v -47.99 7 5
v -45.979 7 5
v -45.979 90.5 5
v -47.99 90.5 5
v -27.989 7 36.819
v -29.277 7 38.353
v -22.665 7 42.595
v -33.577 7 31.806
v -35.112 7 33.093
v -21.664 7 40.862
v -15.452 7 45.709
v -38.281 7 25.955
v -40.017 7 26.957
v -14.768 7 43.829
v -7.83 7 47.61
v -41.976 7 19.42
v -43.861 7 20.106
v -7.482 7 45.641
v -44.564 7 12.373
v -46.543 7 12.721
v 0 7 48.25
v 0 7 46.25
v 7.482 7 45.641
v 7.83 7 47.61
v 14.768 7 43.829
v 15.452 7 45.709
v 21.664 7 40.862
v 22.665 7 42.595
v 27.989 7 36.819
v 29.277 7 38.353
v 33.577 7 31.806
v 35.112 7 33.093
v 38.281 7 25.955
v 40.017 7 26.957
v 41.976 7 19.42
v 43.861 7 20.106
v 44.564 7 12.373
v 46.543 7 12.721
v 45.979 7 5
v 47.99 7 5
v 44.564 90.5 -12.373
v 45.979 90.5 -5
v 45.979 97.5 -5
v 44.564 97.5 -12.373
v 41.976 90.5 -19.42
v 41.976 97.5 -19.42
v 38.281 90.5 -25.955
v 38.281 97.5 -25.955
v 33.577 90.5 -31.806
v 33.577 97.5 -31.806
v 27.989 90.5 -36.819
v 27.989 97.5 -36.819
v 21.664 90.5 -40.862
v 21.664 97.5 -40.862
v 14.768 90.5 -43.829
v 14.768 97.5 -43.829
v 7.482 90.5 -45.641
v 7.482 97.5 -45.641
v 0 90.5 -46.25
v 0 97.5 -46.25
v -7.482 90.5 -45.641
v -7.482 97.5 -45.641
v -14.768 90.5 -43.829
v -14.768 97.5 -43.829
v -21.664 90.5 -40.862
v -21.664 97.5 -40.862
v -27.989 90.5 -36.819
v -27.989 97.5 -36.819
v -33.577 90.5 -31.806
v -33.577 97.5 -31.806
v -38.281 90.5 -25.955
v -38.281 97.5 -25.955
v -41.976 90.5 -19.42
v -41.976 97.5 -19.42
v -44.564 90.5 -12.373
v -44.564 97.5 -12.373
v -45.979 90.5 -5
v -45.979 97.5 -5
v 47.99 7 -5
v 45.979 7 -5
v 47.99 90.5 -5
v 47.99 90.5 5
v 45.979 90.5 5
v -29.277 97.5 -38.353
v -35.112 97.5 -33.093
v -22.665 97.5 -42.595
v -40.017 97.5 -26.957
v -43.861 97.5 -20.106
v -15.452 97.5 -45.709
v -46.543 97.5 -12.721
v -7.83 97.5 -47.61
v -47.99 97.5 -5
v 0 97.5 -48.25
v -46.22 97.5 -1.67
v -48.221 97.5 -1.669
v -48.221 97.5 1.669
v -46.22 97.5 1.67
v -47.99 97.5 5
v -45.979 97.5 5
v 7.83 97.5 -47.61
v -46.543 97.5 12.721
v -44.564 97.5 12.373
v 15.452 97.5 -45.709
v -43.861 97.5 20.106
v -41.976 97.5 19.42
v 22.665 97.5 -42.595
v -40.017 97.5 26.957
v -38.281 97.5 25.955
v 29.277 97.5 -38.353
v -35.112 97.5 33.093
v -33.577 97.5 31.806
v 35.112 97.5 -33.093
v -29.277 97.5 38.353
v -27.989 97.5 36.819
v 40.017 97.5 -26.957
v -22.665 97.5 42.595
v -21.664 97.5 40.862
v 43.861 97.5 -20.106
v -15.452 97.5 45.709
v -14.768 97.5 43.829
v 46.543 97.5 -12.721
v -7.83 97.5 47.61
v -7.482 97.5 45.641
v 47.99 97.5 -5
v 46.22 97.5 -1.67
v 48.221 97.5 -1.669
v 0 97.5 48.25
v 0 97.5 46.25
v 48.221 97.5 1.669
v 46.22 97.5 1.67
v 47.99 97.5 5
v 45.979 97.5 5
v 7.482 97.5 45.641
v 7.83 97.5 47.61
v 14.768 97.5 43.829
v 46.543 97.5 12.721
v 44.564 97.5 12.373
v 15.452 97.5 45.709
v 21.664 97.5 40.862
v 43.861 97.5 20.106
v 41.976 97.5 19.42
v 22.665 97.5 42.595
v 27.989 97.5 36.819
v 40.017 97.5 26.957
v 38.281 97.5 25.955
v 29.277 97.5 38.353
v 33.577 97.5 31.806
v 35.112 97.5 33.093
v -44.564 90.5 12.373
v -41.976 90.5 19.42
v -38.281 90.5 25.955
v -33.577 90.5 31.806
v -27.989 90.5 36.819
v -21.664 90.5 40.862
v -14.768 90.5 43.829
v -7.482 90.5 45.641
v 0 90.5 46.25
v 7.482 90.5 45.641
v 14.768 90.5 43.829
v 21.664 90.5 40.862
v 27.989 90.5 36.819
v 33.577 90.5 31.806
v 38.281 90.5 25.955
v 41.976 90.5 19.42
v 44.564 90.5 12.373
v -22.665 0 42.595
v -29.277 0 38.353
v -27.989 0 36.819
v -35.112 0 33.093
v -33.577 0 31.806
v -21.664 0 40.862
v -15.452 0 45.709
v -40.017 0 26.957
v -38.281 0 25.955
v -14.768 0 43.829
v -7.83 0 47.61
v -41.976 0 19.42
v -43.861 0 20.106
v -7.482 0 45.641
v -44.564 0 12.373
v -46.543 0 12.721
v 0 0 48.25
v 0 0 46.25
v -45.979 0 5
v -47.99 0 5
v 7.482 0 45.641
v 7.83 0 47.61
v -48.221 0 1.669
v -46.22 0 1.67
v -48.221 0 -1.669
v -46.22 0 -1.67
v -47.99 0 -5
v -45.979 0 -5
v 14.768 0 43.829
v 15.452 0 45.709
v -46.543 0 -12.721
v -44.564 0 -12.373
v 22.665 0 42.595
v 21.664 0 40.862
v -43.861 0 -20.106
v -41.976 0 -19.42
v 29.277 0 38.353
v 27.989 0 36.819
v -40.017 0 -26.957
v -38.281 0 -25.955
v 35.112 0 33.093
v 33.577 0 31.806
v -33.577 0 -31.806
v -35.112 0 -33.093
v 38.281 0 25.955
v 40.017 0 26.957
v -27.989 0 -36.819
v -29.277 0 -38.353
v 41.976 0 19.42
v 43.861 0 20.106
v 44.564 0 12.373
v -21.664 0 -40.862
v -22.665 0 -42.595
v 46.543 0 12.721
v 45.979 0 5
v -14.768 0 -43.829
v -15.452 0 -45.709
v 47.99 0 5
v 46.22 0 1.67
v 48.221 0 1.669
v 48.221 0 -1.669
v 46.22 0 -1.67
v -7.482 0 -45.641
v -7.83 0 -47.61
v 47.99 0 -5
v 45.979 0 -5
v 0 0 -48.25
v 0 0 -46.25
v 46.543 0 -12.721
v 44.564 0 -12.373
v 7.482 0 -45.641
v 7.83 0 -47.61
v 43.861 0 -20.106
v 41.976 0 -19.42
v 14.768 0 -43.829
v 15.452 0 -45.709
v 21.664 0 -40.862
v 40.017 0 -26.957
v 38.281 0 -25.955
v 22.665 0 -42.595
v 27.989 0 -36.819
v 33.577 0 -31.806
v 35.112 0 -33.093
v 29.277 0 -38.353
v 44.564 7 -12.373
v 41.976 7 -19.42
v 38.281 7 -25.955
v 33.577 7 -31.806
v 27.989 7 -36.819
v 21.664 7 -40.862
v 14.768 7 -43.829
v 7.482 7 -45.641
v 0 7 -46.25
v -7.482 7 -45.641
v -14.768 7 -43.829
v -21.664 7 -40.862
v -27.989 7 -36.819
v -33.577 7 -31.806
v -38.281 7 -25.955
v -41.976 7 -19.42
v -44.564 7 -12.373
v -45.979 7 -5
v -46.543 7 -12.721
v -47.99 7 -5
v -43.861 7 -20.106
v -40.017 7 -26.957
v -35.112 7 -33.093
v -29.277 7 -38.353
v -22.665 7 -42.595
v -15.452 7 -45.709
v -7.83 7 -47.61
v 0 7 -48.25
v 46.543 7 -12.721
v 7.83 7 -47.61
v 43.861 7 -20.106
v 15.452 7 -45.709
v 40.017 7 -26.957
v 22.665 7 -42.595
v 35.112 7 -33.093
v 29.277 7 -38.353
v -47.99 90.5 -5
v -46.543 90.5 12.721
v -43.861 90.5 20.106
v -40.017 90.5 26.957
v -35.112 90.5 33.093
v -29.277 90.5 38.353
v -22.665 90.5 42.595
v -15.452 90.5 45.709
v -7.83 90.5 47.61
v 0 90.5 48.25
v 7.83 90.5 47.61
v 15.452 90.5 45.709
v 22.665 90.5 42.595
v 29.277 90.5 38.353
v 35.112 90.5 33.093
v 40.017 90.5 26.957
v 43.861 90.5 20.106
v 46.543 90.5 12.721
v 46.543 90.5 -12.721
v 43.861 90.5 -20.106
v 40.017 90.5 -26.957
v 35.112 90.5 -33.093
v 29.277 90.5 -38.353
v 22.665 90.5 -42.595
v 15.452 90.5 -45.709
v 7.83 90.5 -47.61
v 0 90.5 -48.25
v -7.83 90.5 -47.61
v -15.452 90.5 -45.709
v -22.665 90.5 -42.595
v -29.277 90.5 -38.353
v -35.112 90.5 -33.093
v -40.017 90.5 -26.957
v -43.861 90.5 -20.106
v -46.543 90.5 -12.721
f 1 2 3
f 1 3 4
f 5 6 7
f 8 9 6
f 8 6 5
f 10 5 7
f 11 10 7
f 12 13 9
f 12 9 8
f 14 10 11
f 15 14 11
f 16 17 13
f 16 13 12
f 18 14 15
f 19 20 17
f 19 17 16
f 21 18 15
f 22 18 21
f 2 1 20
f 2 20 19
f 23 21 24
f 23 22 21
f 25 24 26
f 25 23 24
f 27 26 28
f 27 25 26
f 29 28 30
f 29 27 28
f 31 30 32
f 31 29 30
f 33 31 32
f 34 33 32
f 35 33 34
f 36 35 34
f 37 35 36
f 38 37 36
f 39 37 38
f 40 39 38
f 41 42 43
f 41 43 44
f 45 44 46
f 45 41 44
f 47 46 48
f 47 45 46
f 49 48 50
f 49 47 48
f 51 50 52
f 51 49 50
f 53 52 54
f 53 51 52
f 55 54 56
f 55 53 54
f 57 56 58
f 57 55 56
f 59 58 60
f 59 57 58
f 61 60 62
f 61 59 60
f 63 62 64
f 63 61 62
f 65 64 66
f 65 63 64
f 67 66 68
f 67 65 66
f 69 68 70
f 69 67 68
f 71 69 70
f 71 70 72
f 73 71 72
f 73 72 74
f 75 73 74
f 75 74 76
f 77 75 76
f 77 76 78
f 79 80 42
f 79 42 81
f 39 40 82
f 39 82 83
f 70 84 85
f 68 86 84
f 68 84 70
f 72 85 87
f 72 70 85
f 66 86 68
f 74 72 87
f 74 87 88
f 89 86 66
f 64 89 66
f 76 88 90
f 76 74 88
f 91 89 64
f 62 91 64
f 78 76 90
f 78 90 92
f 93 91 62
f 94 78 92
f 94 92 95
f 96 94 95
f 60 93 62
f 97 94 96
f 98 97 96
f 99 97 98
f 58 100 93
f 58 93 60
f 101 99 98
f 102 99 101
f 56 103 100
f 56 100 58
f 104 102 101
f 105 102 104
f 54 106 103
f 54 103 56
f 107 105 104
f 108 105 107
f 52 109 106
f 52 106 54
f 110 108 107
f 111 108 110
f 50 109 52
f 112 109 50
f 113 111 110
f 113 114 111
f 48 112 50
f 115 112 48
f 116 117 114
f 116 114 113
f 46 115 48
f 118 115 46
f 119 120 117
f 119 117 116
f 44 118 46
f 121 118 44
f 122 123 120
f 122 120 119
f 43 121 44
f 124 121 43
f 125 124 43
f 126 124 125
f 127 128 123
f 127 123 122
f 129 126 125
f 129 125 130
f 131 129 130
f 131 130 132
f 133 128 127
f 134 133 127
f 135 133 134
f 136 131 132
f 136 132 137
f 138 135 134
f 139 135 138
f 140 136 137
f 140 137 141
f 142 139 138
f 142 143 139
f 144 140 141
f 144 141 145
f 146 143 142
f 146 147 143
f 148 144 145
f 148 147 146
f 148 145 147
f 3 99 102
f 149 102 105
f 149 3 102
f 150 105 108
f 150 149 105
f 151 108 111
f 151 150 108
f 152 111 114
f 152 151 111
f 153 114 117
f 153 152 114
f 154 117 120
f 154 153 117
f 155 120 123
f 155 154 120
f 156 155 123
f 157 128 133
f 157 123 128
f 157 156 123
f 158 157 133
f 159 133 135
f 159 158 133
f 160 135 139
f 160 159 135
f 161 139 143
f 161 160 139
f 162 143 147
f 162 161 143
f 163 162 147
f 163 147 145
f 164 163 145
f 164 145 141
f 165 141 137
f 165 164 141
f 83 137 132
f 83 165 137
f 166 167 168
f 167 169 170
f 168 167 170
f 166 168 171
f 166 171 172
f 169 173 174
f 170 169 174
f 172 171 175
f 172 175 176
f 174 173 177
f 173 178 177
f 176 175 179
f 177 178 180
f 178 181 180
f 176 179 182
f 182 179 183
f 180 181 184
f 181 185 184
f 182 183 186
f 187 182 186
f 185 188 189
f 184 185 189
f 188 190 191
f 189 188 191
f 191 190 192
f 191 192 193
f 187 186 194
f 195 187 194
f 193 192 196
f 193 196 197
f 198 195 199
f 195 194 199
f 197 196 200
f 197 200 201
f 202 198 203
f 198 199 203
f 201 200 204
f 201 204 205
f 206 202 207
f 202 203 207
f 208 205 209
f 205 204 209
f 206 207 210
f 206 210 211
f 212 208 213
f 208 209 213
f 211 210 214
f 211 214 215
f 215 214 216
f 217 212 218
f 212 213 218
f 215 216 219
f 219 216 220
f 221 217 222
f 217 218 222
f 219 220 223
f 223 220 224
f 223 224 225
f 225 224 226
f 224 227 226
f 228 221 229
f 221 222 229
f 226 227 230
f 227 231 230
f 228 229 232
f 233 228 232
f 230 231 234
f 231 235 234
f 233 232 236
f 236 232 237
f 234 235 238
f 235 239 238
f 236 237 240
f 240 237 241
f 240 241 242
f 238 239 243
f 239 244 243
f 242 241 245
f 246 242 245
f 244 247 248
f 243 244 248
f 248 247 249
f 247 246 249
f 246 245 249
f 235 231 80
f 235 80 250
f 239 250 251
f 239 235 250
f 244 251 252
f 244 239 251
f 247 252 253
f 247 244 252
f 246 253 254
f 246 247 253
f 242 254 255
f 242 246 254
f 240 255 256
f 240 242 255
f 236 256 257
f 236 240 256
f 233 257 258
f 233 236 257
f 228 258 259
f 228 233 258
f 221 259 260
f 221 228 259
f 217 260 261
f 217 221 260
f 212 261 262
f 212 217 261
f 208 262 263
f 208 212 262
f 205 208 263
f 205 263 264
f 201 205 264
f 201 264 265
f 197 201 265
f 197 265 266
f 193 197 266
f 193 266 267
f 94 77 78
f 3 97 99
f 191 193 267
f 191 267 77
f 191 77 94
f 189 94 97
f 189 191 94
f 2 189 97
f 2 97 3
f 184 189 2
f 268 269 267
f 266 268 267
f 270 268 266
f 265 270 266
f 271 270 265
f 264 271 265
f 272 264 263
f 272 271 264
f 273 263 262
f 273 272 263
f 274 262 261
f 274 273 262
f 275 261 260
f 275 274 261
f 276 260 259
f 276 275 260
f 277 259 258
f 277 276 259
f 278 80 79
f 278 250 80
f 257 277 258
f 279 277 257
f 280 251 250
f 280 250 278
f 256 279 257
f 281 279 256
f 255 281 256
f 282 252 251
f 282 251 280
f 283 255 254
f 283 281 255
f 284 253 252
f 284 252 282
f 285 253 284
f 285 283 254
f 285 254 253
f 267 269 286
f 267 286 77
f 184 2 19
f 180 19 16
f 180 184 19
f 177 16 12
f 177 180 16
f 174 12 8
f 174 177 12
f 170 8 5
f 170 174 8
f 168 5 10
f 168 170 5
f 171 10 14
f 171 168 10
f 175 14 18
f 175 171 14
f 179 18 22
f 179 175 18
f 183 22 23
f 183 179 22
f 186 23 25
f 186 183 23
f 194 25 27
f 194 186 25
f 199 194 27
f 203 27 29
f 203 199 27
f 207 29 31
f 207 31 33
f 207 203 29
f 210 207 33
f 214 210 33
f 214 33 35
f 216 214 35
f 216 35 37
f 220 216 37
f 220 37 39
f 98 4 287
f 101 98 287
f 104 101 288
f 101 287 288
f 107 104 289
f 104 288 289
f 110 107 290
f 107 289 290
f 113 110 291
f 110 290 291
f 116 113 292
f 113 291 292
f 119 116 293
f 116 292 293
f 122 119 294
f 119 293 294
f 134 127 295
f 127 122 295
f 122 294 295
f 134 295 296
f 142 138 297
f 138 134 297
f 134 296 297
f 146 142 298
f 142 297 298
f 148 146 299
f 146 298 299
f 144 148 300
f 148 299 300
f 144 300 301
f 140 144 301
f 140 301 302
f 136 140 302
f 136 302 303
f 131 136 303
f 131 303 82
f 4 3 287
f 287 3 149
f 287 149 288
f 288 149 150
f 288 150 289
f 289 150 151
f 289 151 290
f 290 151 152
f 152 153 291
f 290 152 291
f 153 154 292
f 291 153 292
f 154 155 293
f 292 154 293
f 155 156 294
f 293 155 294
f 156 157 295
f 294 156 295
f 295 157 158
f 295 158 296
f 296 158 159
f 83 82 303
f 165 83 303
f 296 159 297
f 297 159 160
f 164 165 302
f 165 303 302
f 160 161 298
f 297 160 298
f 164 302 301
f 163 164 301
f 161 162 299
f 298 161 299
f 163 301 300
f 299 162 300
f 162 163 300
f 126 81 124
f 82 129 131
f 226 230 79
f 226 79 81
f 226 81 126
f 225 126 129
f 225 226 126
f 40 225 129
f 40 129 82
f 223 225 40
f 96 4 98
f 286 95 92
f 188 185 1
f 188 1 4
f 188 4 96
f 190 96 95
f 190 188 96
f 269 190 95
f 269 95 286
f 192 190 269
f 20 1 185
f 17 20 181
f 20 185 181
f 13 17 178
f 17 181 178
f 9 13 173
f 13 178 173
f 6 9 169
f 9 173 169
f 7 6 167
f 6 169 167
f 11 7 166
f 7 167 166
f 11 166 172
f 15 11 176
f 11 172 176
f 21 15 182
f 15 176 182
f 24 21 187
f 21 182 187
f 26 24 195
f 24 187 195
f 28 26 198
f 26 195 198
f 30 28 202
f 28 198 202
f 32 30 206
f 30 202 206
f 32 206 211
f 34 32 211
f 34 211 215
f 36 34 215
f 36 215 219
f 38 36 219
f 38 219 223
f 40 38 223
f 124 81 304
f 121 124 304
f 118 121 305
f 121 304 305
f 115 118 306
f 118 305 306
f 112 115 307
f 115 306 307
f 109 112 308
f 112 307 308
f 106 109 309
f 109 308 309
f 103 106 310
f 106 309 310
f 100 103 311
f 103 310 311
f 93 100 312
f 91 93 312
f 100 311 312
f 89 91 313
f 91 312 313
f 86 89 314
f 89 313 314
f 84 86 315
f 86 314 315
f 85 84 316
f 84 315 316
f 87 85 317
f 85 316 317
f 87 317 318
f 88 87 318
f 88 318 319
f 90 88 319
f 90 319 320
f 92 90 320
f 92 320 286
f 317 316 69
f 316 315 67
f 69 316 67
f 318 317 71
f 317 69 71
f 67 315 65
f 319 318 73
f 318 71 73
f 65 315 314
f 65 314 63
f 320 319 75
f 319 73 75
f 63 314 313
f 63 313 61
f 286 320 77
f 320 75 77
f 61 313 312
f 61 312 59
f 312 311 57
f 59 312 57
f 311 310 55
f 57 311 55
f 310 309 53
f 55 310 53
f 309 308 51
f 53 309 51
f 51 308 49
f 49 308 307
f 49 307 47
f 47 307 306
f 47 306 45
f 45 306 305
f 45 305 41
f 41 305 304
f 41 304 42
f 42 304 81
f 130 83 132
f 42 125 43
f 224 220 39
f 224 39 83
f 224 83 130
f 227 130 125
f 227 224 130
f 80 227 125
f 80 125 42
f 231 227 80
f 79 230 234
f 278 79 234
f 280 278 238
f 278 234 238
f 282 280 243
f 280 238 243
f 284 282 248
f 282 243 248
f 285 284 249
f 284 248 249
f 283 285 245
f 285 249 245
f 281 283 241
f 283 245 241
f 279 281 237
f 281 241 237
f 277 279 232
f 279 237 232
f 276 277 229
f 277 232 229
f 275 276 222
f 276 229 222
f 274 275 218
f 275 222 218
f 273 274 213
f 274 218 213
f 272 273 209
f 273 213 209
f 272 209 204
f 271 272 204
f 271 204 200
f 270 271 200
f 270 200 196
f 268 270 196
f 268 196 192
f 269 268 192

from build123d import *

# Parameters (mm, degrees)
BOSS_EXTRUDE1_DEPTH   = 97.5
BOSS_EXTRUDE1_2_DEPTH = 97.5
SKETCH2_R             = 48.25
SKETCH2_R_2           = 46.25
BOSS_EXTRUDE2_DEPTH   = 7
BOSS_EXTRUDE3_START   = -7
SKETCH3_R             = 48.25
SKETCH3_R_2           = 46.25
BOSS_EXTRUDE3_DEPTH   = 7


with BuildPart() as part:
    # Sketch1 → Boss-Extrude1 (new body)
    with BuildSketch(Plane(origin=(0, 0, 0), x_dir=(1, 0, 0), z_dir=(0, 1, 0))):
        with BuildLine():
            Line((-47.990233381, 5), (-45.978935394, 5))
            ThreePointArc((-45.978935394, 5), (-46.25, 0), (-45.978935394, -5))
            Line((-45.978935394, -5), (-47.990233381, -5))
            ThreePointArc((-47.990233381, -5), (-48.25, 0), (-47.990233381, 5))
        make_face()
    extrude(amount=BOSS_EXTRUDE1_DEPTH)



with BuildPart() as body_2:
    # Sketch1 → Boss-Extrude1 2 (new body)
    with BuildSketch(Plane(origin=(0, 0, 0), x_dir=(1, 0, 0), z_dir=(0, 1, 0))):
        with BuildLine():
            Line((47.990233381, -5), (45.978935394, -5))
            ThreePointArc((45.978935394, -5), (46.25, 0), (45.978935394, 5))
            Line((45.978935394, 5), (47.990233381, 5))
            ThreePointArc((47.990233381, 5), (48.25, 0), (47.990233381, -5))
        make_face()
    extrude(amount=BOSS_EXTRUDE1_2_DEPTH)


with BuildPart() as part_1:
    add(part.part)

    add(body_2.part)  # Boss-Extrude2 merges body 2
    # Sketch2 → Boss-Extrude2 (add)
    with BuildSketch(Plane(origin=(0, 0, 0), x_dir=(1, 0, 0), z_dir=(0, 1, 0))):
        with Locations(Location((0, 0, 0), (0, 0, 5.94806464))):
            Circle(SKETCH2_R)
        with Locations(Location((0, 0, 0), (0, 0, 173.793732249))):
            Circle(SKETCH2_R_2, mode=Mode.SUBTRACT)
    extrude(amount=BOSS_EXTRUDE2_DEPTH)

    # Sketch3 → Boss-Extrude3 (add)
    with BuildSketch(Plane(origin=(0, 97.5, 0), x_dir=(1, 0, 0), z_dir=(0, 1, 0)).offset(BOSS_EXTRUDE3_START)):
        with Locations(Location((0, 0, 0), (0, 0, 270))):
            Circle(SKETCH3_R)
        with Locations(Location((0, 0, 0), (0, 0, 270))):
            Circle(SKETCH3_R_2, mode=Mode.SUBTRACT)
    extrude(amount=BOSS_EXTRUDE3_DEPTH)


solid = part_1.part
